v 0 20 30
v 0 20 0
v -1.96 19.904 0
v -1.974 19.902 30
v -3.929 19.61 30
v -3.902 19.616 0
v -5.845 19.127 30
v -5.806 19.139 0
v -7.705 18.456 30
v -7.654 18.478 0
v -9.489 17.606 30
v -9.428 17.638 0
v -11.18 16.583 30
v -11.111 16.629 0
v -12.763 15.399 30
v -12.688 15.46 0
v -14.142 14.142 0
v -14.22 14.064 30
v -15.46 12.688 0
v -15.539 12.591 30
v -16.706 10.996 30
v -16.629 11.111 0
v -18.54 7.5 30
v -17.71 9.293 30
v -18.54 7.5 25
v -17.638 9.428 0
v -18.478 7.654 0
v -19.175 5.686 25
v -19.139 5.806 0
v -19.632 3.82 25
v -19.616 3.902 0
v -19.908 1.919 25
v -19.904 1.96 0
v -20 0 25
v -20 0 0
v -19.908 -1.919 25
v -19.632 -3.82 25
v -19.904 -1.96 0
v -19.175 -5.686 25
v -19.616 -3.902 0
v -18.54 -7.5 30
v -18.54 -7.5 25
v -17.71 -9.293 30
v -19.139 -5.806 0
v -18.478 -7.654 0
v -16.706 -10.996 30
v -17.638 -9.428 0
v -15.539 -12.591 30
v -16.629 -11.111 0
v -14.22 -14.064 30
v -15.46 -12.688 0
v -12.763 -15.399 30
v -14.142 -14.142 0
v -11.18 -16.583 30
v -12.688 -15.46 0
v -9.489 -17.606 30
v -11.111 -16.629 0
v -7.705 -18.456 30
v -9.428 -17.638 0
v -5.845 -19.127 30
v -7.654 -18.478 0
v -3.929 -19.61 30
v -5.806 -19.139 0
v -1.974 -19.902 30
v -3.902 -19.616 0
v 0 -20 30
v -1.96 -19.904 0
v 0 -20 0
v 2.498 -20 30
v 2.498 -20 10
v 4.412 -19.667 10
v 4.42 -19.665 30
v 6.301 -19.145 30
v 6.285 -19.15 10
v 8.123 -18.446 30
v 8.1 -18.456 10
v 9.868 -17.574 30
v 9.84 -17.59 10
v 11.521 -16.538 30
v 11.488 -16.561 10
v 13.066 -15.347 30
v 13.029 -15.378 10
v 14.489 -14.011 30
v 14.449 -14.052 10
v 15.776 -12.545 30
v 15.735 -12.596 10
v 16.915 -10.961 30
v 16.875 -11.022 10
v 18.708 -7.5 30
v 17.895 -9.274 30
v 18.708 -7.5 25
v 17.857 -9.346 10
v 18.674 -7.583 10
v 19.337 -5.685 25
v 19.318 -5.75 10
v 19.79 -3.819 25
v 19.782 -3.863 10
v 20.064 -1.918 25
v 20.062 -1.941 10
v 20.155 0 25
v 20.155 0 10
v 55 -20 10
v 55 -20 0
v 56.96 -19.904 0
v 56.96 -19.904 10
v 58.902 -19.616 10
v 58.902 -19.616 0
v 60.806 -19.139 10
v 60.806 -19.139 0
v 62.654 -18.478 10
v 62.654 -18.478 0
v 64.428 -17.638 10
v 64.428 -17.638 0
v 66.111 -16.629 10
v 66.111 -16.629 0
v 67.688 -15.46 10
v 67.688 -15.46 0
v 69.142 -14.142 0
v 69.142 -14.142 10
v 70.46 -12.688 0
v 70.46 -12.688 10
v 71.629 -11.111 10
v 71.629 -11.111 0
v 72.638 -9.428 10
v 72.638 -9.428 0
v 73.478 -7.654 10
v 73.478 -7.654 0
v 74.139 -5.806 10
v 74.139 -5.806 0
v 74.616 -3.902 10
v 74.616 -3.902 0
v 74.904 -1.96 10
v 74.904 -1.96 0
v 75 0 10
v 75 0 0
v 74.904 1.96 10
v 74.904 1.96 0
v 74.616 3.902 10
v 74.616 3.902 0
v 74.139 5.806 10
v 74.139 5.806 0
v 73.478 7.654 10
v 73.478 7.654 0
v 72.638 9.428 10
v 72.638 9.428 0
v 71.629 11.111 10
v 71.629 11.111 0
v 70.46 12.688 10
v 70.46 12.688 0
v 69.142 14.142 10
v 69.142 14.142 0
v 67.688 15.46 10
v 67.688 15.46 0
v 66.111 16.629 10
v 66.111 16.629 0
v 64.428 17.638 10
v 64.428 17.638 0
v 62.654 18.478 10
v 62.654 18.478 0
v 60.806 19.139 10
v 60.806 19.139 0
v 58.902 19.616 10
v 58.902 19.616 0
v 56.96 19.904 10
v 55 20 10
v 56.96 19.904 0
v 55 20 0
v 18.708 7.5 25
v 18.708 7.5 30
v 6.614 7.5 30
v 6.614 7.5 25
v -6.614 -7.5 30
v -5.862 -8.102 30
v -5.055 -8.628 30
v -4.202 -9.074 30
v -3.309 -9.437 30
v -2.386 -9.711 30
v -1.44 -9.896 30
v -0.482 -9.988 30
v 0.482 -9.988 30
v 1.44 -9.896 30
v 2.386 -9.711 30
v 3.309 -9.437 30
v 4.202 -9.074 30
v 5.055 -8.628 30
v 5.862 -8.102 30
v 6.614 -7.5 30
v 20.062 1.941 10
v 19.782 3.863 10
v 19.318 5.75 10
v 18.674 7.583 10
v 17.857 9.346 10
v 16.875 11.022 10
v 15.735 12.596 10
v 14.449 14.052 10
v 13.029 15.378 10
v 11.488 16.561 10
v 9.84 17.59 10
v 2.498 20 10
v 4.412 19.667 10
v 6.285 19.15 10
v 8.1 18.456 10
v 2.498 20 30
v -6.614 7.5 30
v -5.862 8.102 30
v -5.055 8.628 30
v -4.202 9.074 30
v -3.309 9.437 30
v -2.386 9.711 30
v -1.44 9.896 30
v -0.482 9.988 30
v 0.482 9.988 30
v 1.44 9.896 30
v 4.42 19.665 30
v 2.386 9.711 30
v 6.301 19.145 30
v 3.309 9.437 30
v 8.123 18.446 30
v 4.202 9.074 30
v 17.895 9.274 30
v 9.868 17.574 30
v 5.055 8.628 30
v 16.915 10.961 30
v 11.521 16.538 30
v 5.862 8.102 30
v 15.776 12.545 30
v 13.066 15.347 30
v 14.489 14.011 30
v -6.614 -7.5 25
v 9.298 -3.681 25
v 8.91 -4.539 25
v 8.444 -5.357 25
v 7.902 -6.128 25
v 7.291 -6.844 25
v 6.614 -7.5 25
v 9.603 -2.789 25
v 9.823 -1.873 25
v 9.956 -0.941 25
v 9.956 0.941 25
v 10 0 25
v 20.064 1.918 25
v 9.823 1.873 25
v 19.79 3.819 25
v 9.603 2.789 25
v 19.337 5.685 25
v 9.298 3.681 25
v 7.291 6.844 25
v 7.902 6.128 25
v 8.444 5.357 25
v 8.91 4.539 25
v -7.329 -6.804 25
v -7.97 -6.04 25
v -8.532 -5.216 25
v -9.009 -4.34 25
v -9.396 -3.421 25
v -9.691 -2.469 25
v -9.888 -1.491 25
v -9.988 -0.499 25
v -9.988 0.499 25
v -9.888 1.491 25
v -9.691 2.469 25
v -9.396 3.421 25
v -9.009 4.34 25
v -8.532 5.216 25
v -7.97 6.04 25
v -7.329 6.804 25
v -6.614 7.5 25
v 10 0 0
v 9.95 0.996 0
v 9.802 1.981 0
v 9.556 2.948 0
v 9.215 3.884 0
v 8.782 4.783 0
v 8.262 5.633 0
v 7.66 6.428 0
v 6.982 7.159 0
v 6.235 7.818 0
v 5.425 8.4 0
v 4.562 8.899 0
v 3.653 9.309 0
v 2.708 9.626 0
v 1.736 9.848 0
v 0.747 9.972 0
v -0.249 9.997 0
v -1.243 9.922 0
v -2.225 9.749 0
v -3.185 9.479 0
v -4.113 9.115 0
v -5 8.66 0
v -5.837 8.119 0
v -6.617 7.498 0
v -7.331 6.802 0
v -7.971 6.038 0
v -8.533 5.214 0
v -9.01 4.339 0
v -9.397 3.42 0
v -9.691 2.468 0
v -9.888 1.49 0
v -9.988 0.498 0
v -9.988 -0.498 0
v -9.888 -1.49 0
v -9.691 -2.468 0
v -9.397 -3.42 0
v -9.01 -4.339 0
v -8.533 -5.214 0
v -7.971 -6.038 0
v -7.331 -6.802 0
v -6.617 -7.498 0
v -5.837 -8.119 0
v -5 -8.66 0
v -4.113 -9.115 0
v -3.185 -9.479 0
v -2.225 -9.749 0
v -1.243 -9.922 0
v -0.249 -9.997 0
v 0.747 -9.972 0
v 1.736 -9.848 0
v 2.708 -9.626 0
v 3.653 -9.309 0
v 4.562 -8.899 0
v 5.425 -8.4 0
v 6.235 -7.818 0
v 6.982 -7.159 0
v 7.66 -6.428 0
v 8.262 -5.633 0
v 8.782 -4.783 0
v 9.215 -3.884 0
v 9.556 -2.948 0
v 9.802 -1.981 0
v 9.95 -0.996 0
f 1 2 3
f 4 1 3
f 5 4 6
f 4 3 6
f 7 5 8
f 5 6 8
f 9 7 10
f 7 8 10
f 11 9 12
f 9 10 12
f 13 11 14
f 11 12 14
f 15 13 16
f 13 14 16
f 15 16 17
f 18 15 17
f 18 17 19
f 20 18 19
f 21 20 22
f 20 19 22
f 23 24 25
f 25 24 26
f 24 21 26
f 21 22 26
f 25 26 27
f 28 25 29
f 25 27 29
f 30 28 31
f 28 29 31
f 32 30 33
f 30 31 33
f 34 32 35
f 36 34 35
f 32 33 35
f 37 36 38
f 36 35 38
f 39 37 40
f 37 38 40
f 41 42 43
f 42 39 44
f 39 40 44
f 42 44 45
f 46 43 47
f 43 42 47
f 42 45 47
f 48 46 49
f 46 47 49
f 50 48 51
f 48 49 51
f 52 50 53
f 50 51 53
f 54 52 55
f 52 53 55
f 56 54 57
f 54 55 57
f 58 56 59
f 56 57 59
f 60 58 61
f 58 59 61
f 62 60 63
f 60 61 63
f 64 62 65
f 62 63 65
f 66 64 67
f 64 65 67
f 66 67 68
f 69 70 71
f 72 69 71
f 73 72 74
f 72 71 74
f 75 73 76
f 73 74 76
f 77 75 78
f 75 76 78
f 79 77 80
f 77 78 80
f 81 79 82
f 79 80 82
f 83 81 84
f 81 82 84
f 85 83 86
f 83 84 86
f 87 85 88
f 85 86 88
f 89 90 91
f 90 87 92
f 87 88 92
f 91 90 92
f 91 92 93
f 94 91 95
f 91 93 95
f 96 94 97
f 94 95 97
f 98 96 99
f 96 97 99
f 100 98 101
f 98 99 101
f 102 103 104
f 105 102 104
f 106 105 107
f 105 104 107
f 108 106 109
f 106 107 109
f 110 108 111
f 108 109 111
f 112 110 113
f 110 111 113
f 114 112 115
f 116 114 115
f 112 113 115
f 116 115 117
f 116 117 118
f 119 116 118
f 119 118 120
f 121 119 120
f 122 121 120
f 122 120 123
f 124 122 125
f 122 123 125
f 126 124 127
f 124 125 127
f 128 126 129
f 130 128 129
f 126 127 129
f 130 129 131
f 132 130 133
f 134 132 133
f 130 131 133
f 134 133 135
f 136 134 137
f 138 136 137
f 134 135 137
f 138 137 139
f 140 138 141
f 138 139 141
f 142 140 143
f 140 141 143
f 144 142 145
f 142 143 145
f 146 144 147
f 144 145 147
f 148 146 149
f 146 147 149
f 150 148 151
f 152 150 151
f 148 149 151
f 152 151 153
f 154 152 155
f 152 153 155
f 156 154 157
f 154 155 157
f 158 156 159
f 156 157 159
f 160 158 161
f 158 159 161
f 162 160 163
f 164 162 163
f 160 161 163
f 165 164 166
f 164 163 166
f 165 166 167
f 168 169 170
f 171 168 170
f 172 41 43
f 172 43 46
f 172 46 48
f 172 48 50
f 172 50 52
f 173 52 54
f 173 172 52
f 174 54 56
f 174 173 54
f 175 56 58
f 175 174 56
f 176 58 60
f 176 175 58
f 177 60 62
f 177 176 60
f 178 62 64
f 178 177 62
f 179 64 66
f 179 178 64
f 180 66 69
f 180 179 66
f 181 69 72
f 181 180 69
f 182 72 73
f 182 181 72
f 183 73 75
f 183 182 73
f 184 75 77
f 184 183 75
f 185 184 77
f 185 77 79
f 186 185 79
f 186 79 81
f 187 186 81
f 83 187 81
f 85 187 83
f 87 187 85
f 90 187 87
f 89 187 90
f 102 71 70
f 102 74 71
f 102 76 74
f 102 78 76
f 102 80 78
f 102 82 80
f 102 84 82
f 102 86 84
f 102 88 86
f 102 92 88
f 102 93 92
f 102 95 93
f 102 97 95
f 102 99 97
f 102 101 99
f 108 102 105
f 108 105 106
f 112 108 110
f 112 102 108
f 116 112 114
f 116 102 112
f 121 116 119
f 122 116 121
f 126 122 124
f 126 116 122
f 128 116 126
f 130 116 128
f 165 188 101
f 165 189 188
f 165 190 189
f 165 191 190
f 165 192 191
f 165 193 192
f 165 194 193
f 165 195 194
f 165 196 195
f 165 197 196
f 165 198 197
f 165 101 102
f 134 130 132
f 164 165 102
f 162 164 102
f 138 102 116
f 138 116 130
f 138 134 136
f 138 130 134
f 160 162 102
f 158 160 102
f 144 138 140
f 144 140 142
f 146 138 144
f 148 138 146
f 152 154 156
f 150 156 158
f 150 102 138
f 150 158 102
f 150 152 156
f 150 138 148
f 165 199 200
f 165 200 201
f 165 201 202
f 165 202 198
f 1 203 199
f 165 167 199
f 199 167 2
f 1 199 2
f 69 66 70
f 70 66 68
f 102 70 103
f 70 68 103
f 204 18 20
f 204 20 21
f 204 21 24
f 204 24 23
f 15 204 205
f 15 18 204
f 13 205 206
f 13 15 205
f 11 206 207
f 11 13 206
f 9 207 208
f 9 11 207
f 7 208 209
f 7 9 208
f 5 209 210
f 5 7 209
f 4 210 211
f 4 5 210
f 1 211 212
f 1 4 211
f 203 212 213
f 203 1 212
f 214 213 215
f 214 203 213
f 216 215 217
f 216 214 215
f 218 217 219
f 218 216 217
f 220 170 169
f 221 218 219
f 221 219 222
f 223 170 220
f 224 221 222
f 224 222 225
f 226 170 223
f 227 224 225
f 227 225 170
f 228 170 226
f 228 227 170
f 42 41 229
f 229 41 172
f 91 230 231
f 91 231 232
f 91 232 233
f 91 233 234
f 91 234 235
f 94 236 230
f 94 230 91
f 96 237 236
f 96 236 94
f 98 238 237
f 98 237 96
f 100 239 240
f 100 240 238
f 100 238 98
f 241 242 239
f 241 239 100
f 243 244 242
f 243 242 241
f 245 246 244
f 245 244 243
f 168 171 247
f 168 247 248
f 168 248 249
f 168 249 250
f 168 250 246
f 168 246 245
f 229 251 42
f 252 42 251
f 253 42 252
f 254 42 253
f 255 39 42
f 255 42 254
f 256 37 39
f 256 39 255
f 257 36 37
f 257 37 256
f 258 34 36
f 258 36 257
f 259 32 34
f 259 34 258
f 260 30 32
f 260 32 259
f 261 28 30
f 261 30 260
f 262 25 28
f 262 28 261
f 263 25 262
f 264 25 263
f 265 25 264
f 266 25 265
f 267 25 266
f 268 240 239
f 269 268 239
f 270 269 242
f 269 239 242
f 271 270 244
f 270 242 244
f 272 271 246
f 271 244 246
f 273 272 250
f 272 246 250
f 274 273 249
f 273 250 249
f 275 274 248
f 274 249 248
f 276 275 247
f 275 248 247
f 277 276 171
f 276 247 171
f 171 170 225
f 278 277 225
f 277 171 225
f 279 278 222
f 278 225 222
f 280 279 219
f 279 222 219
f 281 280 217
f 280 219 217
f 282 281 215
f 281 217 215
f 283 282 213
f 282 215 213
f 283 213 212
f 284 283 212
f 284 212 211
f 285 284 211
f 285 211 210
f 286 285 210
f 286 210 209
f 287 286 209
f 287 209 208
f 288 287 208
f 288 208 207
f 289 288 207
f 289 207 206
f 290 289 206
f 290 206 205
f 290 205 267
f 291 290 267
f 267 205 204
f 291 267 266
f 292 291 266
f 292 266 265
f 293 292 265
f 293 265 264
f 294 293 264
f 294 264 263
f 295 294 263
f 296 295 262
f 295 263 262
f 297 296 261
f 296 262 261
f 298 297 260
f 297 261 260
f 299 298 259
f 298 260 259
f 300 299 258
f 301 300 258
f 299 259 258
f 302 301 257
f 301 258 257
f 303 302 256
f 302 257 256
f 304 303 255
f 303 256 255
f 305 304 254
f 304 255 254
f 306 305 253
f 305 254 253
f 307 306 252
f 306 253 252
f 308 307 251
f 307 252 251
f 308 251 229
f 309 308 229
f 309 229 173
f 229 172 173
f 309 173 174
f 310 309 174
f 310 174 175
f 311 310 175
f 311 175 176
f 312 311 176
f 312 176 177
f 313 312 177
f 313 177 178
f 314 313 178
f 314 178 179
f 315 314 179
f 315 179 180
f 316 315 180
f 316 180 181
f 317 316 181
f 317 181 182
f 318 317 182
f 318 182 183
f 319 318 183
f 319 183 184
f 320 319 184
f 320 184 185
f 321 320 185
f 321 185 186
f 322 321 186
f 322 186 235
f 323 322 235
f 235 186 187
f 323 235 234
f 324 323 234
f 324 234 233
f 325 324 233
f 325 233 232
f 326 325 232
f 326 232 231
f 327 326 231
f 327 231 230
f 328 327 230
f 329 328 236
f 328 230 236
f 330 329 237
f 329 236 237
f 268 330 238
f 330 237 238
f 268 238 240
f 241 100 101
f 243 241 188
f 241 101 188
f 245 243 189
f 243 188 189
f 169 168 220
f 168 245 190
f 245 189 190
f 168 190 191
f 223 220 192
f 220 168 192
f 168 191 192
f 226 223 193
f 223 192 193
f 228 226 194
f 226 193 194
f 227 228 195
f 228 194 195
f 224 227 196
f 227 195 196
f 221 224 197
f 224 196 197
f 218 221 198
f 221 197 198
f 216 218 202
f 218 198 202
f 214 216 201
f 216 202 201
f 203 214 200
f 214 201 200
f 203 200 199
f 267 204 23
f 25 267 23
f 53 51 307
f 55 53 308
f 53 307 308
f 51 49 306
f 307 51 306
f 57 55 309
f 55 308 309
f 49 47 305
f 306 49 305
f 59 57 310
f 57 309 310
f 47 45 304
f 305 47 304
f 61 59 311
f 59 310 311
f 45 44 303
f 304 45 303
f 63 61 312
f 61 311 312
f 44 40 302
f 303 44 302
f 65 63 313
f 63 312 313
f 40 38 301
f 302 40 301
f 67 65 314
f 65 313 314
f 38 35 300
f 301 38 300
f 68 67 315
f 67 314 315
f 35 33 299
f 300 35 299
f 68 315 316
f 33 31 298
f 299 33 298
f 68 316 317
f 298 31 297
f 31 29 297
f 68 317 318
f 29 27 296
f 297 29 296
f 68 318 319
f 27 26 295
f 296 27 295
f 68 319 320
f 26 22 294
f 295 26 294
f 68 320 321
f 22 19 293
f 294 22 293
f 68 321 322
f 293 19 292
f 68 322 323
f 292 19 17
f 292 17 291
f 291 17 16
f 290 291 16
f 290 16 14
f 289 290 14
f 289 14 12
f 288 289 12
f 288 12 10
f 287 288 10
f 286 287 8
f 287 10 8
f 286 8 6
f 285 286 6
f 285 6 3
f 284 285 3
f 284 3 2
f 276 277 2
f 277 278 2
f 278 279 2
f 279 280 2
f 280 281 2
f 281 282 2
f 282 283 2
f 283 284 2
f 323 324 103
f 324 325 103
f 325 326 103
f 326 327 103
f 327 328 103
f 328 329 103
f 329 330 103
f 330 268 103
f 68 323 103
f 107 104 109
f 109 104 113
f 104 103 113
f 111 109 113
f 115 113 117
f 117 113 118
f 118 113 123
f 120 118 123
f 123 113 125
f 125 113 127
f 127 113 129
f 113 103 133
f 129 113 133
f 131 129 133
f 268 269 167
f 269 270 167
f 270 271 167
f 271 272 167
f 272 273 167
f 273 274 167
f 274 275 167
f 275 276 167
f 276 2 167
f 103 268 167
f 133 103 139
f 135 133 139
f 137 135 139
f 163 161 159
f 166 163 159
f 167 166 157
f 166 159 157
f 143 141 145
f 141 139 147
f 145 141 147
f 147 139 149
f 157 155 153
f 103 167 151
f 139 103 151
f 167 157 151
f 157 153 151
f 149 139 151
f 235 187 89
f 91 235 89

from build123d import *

# Parameters (mm, degrees)
F1_DEPTH = 10
F3_DEPTH = 20
F4_R     = 10
F5_DEPTH = 30.001
F7_DEPTH = 5


with BuildPart() as f1:
    # F0 (on Top) → F1 (new body)
    with BuildSketch(Plane.XY):
        with BuildLine():
            Line((55, 20), (0, 20))
            ThreePointArc((0, 20), (-20, 0), (0, -20))
            Line((0, -20), (55, -20))
            ThreePointArc((55, -20), (75, 0), (55, 20))
        make_face()
    extrude(amount=F1_DEPTH)

    # F2 (on face) → F3 (join)
    with BuildSketch(Plane.XY.offset(10)):
        with BuildLine():
            ThreePointArc((2.4982464904, -20), (15.1095079365, -13.3395654143), (20.1554269498, 0))
            ThreePointArc((20.1554269498, 0), (15.1095079365, 13.3395654143), (2.4982464904, 20))
            Line((2.4982464904, 20), (0, 20))
            ThreePointArc((0, 20), (-20, 0), (0, -20))
            Line((0, -20), (2.4982464904, -20))
        make_face()
    extrude(amount=F3_DEPTH)

    # F4 (on face) → F5 (cut, through all)
    with BuildSketch(Plane.XY.offset(30)):
        Circle(F4_R)
    extrude(amount=-F5_DEPTH, mode=Mode.SUBTRACT)

    # F6 (on face) → F7 (cut)
    with BuildSketch(Plane.XY.offset(30)):
        with BuildLine():
            Line((-6.6143782777, 7.5), (-18.5404962177, 7.5))
            ThreePointArc((-18.5404962177, 7.5), (-20, 0), (-18.5404962177, -7.5))
            Line((-18.5404962177, -7.5), (-6.6143782777, -7.5))
            ThreePointArc((-6.6143782777, -7.5), (-10, 0), (-6.6143782777, 7.5))
        make_face()
        with BuildLine():
            Line((18.708052692, 7.5), (6.6143782777, 7.5))
            ThreePointArc((6.6143782777, 7.5), (9.1143782777, 4.1143782777), (10, 0))
            ThreePointArc((10, 0), (9.1143782777, -4.1143782777), (6.6143782777, -7.5))
            Line((6.6143782777, -7.5), (18.708052692, -7.5))
            ThreePointArc((18.708052692, -7.5), (20.1554269498, 0), (18.708052692, 7.5))
        make_face()
    extrude(amount=-F7_DEPTH, mode=Mode.SUBTRACT)


solid = f1.part
